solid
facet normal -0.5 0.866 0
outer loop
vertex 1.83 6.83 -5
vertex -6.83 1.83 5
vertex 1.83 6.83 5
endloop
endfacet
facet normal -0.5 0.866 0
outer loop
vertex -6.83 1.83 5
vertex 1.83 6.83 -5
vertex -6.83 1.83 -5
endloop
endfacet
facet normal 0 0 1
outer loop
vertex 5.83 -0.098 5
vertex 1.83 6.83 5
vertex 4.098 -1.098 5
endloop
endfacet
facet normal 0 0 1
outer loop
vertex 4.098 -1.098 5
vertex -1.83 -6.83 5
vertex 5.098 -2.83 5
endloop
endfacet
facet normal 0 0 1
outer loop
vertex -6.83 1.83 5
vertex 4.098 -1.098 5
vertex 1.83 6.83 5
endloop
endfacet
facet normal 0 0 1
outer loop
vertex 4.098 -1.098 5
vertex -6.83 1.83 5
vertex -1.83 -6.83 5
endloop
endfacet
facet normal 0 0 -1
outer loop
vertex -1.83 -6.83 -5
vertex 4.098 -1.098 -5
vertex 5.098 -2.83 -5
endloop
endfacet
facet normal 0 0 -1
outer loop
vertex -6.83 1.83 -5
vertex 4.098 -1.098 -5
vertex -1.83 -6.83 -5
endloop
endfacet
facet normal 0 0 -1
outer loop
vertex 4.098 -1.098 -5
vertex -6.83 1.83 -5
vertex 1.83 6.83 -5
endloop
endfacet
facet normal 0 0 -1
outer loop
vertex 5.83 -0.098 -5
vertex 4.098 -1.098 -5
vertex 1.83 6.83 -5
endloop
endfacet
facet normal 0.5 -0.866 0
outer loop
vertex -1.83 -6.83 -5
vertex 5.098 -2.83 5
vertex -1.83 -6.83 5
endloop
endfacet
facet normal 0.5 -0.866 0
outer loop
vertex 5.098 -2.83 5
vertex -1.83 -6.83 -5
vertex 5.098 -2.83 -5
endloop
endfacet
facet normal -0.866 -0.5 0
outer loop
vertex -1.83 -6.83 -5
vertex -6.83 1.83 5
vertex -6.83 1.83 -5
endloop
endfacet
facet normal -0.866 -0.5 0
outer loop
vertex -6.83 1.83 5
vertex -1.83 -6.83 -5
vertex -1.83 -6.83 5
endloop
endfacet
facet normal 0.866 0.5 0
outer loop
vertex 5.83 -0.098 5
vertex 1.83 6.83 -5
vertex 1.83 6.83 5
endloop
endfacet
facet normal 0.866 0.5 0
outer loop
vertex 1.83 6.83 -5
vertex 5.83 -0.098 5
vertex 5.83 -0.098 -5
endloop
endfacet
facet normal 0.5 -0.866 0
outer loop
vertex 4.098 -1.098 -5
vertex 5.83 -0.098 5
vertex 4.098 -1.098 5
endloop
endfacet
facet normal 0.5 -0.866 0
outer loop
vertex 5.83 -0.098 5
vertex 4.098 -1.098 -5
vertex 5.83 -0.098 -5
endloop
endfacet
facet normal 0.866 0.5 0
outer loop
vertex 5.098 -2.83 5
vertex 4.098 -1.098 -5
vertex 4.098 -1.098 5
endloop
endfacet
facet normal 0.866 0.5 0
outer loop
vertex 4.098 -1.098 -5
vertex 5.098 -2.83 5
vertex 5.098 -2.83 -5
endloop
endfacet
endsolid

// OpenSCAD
rotate([0,0,+120]) {
    difference() {
        cube(10, center=true);
        translate([-8,-8,0])
            cube(10, center=true);
    }
}
